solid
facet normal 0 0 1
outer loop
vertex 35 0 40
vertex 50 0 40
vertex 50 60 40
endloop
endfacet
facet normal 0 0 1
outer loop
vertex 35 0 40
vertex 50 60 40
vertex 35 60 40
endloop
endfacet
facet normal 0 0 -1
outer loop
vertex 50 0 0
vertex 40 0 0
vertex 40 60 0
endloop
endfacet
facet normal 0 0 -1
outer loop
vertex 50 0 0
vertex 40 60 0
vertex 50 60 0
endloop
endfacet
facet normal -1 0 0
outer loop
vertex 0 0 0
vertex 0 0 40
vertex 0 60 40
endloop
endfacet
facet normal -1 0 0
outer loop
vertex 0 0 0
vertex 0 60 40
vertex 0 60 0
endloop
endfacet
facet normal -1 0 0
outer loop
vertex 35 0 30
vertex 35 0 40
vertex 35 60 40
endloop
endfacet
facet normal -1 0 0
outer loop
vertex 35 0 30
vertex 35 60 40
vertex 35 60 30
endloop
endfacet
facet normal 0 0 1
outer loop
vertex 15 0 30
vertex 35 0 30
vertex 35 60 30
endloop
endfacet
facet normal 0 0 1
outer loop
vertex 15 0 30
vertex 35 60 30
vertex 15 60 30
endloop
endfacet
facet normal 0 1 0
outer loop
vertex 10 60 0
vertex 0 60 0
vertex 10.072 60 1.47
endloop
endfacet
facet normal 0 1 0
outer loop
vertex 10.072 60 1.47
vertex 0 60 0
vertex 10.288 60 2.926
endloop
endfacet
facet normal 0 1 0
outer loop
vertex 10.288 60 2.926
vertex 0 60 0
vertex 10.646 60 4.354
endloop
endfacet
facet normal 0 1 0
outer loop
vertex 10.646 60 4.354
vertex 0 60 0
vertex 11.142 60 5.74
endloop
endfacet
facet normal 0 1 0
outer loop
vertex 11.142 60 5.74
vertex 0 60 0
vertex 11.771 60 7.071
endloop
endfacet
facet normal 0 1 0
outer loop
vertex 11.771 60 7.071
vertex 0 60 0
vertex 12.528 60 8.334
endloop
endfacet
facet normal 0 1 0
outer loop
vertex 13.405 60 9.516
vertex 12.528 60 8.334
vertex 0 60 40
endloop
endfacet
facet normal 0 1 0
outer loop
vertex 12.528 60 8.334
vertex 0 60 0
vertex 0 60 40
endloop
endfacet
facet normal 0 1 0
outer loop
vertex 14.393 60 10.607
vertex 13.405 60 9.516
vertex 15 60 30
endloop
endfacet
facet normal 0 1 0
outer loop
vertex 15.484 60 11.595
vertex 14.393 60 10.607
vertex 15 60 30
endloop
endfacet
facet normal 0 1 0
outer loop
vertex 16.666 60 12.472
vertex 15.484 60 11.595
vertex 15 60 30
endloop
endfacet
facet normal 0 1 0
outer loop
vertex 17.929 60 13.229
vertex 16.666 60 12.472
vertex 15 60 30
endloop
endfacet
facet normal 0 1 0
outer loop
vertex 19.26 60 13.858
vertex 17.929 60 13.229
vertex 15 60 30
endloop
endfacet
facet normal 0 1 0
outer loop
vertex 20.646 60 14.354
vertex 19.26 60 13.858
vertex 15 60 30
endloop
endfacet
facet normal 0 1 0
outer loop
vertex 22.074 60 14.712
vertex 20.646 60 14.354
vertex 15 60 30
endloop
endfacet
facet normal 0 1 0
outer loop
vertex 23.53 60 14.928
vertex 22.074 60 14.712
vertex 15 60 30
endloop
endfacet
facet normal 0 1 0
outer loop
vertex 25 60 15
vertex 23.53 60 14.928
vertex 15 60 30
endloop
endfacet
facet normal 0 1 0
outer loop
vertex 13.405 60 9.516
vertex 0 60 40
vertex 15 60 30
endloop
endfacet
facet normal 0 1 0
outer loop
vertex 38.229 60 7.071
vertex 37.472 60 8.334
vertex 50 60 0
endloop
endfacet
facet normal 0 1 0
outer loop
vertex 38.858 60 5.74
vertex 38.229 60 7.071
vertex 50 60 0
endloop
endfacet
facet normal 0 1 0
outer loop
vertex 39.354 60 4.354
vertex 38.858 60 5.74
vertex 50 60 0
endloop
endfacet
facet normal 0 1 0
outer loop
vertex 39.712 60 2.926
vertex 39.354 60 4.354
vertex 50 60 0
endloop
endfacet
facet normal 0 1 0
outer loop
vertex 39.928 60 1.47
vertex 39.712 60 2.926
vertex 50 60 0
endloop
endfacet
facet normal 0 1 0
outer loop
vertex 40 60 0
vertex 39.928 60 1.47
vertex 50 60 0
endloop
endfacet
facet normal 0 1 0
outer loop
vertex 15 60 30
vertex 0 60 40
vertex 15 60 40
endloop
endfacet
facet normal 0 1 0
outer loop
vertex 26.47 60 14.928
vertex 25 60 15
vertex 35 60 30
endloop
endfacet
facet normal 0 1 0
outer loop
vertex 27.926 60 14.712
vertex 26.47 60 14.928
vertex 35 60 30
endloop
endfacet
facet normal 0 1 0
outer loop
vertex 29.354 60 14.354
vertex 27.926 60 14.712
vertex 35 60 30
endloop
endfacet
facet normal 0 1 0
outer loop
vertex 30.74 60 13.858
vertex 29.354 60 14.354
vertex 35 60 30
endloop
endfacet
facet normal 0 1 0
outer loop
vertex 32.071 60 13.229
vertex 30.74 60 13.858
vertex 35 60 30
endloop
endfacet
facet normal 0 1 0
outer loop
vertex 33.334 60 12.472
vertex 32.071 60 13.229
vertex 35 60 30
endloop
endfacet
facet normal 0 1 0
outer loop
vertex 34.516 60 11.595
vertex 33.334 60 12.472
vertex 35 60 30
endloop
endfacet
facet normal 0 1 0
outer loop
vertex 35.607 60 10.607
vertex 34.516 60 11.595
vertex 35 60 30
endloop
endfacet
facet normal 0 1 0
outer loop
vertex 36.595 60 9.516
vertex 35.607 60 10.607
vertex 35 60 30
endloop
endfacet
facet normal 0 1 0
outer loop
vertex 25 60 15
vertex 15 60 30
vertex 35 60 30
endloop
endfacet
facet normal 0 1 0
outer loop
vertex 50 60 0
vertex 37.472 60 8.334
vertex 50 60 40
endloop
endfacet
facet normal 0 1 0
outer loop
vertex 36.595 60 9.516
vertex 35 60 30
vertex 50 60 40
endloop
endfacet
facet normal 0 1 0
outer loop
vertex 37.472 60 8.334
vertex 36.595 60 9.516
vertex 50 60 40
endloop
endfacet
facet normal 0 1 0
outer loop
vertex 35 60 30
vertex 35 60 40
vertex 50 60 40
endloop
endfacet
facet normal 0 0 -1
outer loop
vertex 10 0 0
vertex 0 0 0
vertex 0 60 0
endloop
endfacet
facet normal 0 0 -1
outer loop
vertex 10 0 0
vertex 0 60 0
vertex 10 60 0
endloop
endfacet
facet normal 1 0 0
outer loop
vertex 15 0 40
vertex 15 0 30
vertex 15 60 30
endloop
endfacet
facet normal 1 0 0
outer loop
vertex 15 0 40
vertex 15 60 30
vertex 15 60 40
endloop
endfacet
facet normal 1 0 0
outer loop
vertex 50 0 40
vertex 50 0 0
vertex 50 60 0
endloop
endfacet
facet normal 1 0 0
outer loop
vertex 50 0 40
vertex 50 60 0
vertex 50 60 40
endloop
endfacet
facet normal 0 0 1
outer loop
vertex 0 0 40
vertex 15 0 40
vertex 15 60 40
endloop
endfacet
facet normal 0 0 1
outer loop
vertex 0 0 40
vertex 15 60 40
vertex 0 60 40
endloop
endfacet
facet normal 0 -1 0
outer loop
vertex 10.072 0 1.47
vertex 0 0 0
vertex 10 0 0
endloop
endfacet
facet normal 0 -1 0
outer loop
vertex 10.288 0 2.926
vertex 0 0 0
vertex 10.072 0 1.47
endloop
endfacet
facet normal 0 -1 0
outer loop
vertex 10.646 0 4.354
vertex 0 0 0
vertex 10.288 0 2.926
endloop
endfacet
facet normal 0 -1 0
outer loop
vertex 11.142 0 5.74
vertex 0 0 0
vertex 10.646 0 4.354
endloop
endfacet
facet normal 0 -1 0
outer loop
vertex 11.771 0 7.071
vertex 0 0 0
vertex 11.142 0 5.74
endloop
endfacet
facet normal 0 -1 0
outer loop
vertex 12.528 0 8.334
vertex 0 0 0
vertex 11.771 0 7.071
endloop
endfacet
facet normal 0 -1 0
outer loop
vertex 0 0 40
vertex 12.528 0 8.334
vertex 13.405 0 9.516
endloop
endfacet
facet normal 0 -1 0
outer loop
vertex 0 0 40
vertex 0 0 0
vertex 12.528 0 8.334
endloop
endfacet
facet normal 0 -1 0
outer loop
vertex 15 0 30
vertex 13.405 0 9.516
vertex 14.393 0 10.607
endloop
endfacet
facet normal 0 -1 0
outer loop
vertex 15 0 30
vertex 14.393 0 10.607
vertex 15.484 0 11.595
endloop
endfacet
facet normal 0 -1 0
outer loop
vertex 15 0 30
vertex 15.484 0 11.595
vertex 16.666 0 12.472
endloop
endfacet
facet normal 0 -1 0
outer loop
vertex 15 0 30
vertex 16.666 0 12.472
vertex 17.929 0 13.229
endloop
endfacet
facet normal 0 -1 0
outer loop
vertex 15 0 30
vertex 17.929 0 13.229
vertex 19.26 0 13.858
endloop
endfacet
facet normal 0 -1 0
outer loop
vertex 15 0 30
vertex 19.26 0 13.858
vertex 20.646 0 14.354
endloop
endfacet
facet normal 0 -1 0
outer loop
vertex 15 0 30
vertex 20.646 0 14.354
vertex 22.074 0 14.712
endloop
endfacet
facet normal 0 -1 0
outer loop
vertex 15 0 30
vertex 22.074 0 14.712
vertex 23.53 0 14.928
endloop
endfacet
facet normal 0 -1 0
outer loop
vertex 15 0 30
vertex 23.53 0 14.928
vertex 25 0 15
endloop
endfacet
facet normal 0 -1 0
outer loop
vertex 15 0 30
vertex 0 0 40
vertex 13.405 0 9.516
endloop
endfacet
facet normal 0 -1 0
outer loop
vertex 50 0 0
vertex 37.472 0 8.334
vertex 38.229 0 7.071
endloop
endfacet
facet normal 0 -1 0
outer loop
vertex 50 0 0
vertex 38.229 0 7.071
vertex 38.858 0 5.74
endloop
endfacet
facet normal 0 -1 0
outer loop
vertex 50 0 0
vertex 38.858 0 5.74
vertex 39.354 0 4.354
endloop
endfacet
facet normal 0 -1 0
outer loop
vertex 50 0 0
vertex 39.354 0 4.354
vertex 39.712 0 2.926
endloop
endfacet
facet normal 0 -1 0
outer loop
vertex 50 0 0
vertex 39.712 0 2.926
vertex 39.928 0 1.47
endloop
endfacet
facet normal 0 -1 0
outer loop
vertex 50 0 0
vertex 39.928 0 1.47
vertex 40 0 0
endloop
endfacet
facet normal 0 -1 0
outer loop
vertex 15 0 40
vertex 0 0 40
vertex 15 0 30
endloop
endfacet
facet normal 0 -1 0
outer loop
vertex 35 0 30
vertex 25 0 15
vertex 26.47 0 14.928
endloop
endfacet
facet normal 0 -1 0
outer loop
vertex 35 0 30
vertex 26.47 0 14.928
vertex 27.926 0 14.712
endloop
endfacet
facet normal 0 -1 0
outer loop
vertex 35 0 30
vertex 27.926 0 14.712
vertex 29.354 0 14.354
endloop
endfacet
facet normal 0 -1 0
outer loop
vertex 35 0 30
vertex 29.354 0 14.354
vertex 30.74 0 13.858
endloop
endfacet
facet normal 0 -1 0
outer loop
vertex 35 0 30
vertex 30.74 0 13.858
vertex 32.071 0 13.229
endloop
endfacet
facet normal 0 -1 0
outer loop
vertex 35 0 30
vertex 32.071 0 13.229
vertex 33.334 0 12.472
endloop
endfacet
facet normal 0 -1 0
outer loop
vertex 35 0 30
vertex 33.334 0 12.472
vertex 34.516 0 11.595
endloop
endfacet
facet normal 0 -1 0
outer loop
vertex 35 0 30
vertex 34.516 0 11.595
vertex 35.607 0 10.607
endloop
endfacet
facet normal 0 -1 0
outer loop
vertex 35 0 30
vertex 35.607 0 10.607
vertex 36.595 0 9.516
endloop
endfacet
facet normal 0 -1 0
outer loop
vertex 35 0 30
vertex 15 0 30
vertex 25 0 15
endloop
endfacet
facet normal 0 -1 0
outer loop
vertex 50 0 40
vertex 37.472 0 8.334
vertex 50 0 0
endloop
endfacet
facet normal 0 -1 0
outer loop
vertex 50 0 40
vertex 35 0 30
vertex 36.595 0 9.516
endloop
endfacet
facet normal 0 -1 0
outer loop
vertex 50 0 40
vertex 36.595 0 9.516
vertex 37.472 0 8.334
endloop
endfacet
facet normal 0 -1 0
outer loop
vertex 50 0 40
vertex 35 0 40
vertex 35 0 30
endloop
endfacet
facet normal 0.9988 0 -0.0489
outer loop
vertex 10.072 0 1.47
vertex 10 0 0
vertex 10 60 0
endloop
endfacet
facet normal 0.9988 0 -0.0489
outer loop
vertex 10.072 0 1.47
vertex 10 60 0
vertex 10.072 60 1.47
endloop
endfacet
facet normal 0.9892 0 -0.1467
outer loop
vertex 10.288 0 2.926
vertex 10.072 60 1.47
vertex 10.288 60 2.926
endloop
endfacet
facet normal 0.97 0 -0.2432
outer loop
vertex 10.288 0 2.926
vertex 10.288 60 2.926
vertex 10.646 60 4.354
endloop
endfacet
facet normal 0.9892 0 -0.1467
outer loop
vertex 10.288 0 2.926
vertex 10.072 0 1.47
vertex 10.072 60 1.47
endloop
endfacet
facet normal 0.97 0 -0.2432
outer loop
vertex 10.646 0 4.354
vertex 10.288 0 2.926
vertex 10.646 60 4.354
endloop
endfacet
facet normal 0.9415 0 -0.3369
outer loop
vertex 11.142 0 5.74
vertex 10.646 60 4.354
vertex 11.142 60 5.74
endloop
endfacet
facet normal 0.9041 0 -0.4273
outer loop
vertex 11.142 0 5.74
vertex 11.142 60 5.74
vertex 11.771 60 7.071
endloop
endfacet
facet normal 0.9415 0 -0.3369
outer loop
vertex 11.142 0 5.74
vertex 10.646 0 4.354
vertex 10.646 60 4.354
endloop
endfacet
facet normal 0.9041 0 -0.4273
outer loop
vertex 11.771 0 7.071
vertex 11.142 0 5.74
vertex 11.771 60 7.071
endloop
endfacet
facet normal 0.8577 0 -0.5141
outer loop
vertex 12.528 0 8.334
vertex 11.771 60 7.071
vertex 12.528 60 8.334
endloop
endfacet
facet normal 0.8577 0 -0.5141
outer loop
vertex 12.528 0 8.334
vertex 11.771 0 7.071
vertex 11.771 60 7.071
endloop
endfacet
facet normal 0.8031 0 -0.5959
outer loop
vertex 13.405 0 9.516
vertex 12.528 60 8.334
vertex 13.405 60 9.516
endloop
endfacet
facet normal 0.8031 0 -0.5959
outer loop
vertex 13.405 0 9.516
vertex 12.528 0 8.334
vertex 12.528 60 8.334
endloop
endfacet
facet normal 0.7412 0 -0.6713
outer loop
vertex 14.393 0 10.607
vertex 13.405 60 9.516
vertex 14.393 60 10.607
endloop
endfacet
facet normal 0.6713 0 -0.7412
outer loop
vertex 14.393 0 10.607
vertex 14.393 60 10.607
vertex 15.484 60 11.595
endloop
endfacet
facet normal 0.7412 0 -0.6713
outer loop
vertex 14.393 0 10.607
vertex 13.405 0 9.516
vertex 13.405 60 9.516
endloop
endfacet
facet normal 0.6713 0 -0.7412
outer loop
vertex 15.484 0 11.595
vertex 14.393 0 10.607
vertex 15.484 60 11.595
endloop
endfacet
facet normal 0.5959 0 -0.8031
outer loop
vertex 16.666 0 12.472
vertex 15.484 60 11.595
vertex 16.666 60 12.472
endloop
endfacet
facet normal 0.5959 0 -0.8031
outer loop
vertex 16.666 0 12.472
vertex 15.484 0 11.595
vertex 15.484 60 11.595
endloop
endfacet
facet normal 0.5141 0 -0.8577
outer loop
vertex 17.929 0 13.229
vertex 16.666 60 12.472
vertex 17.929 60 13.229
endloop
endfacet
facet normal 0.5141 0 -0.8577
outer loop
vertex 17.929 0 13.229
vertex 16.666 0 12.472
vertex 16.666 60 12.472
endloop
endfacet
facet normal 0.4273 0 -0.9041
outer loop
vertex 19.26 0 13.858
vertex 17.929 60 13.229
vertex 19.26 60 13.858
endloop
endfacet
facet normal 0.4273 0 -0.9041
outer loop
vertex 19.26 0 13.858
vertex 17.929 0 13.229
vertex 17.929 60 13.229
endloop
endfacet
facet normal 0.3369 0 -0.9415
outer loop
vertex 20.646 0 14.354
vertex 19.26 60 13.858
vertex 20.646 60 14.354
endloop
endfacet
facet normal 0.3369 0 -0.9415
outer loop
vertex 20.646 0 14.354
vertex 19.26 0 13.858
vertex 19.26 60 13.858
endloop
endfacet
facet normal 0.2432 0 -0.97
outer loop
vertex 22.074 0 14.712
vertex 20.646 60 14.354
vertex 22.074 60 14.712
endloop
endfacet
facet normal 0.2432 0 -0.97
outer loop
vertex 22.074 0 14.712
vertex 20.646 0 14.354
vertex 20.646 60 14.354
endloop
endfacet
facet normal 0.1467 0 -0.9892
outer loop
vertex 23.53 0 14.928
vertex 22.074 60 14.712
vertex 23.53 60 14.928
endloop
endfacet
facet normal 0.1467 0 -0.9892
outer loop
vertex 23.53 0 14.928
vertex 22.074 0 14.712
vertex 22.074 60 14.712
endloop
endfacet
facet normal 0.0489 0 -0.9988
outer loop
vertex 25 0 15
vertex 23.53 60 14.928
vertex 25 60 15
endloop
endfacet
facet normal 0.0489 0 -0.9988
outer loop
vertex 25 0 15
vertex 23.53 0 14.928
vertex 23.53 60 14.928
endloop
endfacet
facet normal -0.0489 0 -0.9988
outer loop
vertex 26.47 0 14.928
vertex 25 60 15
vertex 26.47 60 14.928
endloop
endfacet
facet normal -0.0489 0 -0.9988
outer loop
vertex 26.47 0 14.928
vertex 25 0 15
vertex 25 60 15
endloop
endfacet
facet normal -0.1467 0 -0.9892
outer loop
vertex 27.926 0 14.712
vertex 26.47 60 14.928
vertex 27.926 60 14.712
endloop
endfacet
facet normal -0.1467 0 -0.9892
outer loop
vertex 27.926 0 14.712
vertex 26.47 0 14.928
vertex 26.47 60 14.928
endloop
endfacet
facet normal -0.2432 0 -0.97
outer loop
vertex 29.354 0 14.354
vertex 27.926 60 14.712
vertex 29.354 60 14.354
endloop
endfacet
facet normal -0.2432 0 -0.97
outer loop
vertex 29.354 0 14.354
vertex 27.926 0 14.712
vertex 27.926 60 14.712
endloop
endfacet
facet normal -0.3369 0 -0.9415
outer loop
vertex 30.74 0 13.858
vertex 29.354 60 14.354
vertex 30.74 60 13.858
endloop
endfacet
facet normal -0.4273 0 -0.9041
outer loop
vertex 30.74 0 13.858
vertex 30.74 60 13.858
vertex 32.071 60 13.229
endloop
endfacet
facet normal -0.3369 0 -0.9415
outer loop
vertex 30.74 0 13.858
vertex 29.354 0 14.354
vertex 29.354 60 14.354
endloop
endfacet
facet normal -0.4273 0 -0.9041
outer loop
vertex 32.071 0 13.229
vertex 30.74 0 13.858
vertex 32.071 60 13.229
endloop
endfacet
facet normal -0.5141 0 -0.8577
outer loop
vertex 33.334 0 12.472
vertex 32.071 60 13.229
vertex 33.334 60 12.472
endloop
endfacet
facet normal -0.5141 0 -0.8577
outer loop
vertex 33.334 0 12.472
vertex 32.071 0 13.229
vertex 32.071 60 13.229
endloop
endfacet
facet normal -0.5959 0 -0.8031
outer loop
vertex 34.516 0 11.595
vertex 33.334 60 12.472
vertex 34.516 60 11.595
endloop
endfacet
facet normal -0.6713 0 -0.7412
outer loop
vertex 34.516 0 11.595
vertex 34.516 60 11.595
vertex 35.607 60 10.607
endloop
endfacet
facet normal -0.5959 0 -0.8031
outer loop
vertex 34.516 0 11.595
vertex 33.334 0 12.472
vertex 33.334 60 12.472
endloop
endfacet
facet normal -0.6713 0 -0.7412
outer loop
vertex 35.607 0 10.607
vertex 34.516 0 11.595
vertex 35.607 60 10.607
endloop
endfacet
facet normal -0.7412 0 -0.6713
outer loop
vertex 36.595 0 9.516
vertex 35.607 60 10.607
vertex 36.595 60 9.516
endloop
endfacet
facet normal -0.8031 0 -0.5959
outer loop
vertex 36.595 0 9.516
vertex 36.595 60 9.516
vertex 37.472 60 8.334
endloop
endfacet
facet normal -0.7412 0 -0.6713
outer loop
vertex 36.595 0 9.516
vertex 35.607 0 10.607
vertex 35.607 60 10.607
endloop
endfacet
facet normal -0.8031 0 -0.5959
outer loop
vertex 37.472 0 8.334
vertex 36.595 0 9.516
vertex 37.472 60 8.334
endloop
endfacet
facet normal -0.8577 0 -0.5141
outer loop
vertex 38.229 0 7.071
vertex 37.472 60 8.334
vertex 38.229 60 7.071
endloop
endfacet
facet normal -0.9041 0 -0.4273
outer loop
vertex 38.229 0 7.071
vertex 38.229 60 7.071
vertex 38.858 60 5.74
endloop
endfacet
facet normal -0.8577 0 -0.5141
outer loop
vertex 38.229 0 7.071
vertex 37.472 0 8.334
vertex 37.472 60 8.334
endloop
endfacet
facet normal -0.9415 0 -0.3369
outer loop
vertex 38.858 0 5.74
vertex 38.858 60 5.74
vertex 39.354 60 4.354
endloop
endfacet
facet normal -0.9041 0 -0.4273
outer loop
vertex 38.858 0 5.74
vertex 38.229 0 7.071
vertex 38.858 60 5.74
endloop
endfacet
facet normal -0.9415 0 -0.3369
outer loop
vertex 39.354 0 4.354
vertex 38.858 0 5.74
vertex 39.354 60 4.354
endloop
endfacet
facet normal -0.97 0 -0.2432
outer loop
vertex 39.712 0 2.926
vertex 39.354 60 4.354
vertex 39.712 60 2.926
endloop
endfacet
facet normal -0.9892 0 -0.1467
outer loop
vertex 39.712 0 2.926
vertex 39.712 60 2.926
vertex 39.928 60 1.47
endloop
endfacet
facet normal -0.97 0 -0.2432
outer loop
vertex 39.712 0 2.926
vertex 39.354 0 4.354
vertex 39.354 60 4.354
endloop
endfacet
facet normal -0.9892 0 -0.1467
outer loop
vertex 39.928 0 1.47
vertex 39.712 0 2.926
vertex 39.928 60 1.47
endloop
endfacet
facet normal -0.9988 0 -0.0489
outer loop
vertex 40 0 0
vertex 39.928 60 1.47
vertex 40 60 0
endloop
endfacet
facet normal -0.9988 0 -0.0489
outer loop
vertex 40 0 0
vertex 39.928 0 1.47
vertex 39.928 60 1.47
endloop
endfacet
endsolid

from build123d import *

# Parameters (mm, degrees)
F1_DEPTH = 60


with BuildPart() as f1:
    # F0 (on Front) → F1 (new body)
    with BuildSketch(Plane.XZ):
        with BuildLine():
            Line((0, 40), (0, 0))
            Line((0, 0), (10, 0))
            ThreePointArc((10, 0), (25, 15), (40, 0))
            Line((40, 0), (50, 0))
            Line((50, 0), (50, 40))
            Line((50, 40), (35, 40))
            Line((35, 40), (35, 30))
            Line((35, 30), (15, 30))
            Line((15, 30), (15, 40))
            Line((15, 40), (0, 40))
        make_face()
    extrude(amount=-F1_DEPTH)


solid = f1.part
